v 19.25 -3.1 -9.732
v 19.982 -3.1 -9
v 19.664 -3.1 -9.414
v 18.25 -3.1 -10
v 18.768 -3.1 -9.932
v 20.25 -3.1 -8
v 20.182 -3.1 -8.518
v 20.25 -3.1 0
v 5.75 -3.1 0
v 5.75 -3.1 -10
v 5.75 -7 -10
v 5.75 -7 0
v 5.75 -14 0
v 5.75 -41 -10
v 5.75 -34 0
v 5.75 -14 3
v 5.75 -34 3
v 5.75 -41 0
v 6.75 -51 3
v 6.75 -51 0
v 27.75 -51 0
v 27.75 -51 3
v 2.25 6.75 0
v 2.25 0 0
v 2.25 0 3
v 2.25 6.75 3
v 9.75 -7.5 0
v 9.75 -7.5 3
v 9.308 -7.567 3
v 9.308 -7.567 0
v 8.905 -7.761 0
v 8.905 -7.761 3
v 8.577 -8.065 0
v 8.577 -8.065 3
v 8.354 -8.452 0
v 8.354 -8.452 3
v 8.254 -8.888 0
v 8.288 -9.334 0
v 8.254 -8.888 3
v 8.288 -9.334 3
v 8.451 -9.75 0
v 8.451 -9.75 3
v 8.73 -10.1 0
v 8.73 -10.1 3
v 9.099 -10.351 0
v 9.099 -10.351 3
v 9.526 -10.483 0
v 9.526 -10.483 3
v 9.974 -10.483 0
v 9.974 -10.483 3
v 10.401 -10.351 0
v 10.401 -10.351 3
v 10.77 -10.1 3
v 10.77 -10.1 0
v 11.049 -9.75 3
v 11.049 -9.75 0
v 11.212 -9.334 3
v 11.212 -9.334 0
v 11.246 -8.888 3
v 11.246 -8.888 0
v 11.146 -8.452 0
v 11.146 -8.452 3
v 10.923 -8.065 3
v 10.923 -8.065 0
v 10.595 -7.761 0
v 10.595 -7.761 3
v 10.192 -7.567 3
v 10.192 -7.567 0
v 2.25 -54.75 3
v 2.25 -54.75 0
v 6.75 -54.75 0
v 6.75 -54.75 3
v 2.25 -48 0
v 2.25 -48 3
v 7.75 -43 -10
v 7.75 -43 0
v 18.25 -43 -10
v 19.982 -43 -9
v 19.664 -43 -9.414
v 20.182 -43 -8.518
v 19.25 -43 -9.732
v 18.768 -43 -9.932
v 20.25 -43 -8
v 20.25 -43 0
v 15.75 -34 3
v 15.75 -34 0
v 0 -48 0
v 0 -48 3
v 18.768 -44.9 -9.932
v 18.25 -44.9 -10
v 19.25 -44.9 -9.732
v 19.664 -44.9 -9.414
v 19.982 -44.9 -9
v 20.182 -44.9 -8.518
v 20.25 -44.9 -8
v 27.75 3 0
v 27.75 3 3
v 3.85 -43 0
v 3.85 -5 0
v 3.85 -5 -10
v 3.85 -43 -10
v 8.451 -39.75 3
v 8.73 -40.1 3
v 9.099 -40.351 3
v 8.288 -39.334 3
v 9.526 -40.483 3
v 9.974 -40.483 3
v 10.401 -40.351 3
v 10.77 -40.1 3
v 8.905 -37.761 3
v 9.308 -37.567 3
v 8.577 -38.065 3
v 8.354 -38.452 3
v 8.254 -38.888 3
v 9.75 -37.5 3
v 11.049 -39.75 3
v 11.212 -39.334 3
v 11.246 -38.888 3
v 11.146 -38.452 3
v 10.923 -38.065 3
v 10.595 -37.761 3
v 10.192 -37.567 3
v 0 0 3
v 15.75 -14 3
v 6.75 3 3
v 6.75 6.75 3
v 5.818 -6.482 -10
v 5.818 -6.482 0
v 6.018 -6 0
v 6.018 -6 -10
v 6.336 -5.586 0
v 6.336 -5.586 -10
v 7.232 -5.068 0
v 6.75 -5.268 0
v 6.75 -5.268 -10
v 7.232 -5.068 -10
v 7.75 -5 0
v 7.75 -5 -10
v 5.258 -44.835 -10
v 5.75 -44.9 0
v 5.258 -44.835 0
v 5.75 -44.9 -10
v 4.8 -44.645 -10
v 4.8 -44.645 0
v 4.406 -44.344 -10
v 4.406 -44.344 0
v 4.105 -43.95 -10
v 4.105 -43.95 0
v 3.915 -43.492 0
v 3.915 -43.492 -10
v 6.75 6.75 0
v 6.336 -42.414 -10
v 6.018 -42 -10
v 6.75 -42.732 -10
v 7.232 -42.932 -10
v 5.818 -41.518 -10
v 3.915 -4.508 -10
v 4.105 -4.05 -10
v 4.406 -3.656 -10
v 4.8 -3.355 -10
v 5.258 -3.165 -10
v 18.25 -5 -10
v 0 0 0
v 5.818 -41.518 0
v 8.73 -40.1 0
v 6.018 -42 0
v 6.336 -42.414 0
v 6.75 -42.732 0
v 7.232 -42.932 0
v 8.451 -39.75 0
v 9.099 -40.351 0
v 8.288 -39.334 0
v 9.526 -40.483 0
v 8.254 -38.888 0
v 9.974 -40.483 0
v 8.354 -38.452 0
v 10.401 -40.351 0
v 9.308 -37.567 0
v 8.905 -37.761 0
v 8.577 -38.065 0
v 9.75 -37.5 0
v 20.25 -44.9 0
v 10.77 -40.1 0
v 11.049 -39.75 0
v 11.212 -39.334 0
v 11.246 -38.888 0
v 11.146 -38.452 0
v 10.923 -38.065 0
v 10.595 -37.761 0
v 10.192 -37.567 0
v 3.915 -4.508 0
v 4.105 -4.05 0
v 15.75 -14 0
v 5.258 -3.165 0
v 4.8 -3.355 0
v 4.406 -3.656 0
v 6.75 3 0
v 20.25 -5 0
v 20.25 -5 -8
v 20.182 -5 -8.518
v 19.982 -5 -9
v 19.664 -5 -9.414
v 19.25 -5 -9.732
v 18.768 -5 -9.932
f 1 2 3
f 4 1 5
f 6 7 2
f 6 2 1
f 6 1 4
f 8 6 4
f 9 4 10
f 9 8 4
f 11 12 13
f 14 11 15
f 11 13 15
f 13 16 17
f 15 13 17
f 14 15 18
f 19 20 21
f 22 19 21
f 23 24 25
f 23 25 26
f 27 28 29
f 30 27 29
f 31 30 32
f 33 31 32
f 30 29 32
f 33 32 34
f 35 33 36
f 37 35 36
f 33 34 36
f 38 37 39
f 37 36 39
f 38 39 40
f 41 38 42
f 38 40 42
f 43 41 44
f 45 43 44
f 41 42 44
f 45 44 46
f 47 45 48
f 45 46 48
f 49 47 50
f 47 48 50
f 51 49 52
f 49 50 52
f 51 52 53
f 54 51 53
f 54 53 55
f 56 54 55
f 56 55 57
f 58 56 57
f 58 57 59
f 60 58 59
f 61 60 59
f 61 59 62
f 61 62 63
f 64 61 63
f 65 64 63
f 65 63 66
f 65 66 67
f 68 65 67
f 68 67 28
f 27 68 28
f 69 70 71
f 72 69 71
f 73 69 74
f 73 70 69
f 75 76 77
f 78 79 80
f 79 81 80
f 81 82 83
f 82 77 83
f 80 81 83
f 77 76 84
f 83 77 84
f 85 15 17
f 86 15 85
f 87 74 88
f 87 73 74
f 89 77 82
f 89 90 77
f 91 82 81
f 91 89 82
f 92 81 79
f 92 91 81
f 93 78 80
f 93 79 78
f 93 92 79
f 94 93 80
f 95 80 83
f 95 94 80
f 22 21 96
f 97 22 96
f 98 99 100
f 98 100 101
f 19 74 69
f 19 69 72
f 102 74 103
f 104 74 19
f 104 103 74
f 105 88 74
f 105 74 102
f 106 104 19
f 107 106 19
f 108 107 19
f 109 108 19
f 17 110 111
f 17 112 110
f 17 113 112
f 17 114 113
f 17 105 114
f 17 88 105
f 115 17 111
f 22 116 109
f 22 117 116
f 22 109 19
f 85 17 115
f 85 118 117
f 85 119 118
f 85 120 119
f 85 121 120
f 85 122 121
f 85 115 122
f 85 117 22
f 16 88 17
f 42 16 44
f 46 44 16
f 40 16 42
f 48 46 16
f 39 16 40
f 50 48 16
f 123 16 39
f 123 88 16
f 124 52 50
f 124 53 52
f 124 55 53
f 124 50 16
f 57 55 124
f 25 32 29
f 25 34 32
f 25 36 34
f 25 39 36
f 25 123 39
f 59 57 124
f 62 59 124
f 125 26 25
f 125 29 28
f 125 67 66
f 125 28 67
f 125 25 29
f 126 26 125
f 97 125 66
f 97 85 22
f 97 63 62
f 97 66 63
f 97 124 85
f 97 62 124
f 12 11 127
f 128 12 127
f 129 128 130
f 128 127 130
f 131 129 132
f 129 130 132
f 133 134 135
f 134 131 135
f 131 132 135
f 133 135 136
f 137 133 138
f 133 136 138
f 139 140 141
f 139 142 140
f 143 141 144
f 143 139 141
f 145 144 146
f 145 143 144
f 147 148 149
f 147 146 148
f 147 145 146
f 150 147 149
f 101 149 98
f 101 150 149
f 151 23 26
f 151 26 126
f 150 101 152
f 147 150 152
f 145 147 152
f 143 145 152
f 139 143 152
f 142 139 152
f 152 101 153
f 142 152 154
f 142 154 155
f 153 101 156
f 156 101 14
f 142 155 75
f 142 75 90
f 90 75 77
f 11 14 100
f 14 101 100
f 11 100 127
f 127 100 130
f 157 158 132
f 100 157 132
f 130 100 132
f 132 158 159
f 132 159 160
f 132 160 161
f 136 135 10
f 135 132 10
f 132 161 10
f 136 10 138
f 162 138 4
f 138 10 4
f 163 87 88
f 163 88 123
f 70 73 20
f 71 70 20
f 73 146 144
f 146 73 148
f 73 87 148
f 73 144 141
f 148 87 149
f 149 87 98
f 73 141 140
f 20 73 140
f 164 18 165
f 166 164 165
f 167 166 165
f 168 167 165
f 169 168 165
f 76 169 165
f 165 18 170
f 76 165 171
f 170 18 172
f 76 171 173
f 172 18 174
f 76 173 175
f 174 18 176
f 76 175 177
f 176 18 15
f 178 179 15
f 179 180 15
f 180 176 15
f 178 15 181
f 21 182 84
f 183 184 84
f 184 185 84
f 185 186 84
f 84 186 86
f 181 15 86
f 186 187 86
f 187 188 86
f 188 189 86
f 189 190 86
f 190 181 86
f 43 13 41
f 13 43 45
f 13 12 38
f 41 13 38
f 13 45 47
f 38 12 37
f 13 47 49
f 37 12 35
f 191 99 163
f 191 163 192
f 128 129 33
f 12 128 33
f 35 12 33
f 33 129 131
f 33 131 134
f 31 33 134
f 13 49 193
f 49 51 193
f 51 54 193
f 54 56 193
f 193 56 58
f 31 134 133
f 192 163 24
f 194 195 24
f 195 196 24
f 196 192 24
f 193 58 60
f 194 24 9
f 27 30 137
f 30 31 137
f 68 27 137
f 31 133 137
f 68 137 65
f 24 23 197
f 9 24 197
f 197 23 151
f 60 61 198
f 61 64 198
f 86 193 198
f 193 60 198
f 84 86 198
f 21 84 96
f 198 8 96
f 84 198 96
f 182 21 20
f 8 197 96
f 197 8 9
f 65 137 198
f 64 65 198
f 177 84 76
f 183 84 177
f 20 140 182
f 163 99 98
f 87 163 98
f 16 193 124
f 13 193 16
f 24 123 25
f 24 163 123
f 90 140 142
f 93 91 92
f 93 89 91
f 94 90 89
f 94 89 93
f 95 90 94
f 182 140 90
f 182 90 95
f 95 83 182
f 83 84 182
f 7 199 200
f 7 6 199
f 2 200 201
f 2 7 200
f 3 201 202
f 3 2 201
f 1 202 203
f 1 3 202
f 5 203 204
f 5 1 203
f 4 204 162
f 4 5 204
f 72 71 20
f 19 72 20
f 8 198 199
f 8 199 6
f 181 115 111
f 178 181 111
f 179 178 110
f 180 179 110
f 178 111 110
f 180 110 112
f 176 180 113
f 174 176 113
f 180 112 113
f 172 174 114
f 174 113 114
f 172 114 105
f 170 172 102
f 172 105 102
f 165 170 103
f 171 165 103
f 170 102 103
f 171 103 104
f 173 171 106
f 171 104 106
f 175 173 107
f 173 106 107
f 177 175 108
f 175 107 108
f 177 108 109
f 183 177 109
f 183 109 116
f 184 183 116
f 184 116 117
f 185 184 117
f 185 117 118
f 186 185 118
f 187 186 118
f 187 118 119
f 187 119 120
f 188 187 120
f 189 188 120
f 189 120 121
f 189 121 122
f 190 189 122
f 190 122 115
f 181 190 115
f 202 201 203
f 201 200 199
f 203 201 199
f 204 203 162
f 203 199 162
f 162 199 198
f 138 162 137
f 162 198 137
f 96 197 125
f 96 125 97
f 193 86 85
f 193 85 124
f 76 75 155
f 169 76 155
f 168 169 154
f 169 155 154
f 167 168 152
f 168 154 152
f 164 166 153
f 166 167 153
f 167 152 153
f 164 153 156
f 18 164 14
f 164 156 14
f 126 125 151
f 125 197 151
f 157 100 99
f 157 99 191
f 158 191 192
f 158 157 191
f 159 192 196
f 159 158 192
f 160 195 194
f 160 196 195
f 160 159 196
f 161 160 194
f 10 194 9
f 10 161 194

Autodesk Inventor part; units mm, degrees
ref_plane "YZ Plane" through (0, 0, 0) normal (1, 0, 0) x (0, 1, 0)
ref_plane "XZ Plane" through (0, 0, 0) normal (0, 1, 0) x (-1, 0, 0)
ref_plane "XY Plane" through (0, 0, 0) normal (0, 0, 1) x (1, 0, 0)
ref_plane "Work Plane1" through (0, 0, 0) normal (0, 0, 1) x (1, 0, 0)
sketch "Sketch1" plane through (0, 0, 0) normal (0, 0, 1) x (1, 0, 0)
  line L0 (0, 0) -> (23.25, 0) projected
  line L1 (0, -48) -> (0, 0) projected
  line L2 (23.25, -48) -> (0, -48) projected
  line L3 (23.25, -48) -> (23.25, -31.5) projected
  line L4 (23.25, -31.5) -> (26.25, -31.5) projected
  line L5 (27.75, -30) -> (26.25, -31.5) projected
  line L6 (27.75, -30) -> (27.75, -18) projected
  line L7 (27.75, -18) -> (26.25, -16.5) projected
  line L8 (23.25, -16.5) -> (26.25, -16.5) projected
  line L9 (23.25, 0) -> (23.25, -16.5) projected
  line L10 (20.25, -16.5) -> (20.25, -3) projected
  line L11 (17.25, -16.5) -> (20.25, -16.5) projected
  line L12 (17.25, -16.5) -> (17.25, -19.5) projected
  line L13 (26.25, -19.5) -> (26.25, -28.5) projected
  line L14 (17.25, -28.5) -> (17.25, -31.5) projected
  line L15 (17.25, -31.5) -> (20.25, -31.5) projected
  line L16 (20.25, -31.5) -> (20.25, -45) projected
  line L17 (3.75, -45) -> (20.25, -45) projected
  line L18 (3.75, -3) -> (3.75, -45) projected
  line L19 (20.25, -3) -> (3.75, -3) projected
  line L20 (17.25, -19.5) -> (17.25, -28.5)
  line L21 (18.25, -33.5) -> (15.25, -33.5)
  line L22 (15.25, -33.5) -> (15.25, -28.5)
  line L23 (15.25, -28.5) -> (15.25, -19.5)
  line L24 (15.25, -19.5) -> (15.25, -14.5)
  line L25 (15.25, -14.5) -> (18.25, -14.5)
  line L26 (20.25, -5) -> (5.75, -5)
  line L27 (5.75, -5) -> (5.75, -43)
  line L28 (5.75, -43) -> (20.25, -43)
extrude "Extrusion1" add sketch "Sketch1" against normal blind 10 contours L26 L27 L28 L16 L17 L18 L19 L10
sketch "Sketch2" plane through (0, 0, 0) normal (0, 0, 1) x (1, 0, 0)
  line L0 (2.25, 0) -> (2.25, 6.75) projected
  line L1 (2.25, 0) -> (3.3, 0) projected
  line L2 (3.3, 0) -> (3.3, 5.7) projected
  line L3 (5.7, 5.7) -> (3.3, 5.7) projected
  line L4 (5.7, 1.95) -> (5.7, 5.7) projected
  line L5 (26.7, 1.95) -> (5.7, 1.95) projected
  line L6 (26.7, 1.95) -> (26.7, -16.95) projected
  line L7 (26.7, -16.95) -> (27.75, -18) projected
  line L8 (27.75, -18) -> (27.75, 3) projected
  line L9 (6.75, 3) -> (27.75, 3) projected
  line L10 (6.75, 3) -> (6.75, 6.75) projected
  line L11 (2.25, 6.75) -> (6.75, 6.75) projected
  line L12 (2.25, -54.75) -> (2.25, -48) projected
  line L13 (2.25, -54.75) -> (6.75, -54.75) projected
  line L14 (6.75, -54.75) -> (6.75, -51) projected
  line L15 (6.75, -51) -> (27.75, -51) projected
  line L16 (27.75, -51) -> (27.75, -30) projected
  line L17 (26.7, -31.05) -> (27.75, -30) projected
  line L18 (26.7, -31.05) -> (26.7, -49.95) projected
  line L19 (26.7, -49.95) -> (5.7, -49.95) projected
  line L20 (5.7, -49.95) -> (5.7, -53.7) projected
  line L21 (3.3, -53.7) -> (5.7, -53.7) projected
  line L22 (3.3, -53.7) -> (3.3, -48) projected
  line L23 (2.25, -48) -> (3.3, -48) projected
  line L24 (0, 0) -> (23.25, 0) projected
  line L25 (0, -48) -> (0, 0) projected
  line L26 (23.25, -48) -> (0, -48) projected
  line L27 (23.25, -48) -> (23.25, -31.5) projected
  line L28 (23.25, -31.5) -> (26.25, -31.5) projected
  line L29 (27.75, -30) -> (26.25, -31.5) projected
  line L30 (27.75, -30) -> (27.75, -18) projected
  line L31 (27.75, -18) -> (26.25, -16.5) projected
  line L32 (23.25, -16.5) -> (26.25, -16.5) projected
  line L33 (23.25, 0) -> (23.25, -16.5) projected
  line L34 (20.25, -16.5) -> (20.25, -3) projected
  line L35 (17.25, -16.5) -> (20.25, -16.5) projected
  line L36 (17.25, -16.5) -> (17.25, -19.5) projected
  line L37 (17.25, -19.5) -> (26.25, -19.5) projected
  line L38 (26.25, -19.5) -> (26.25, -28.5) projected
  line L39 (17.25, -28.5) -> (26.25, -28.5) projected
  line L40 (17.25, -28.5) -> (17.25, -31.5) projected
  line L41 (17.25, -31.5) -> (20.25, -31.5) projected
  line L42 (20.25, -31.5) -> (20.25, -45) projected
  line L43 (3.75, -45) -> (20.25, -45) projected
  line L44 (3.75, -3) -> (3.75, -45) projected
  line L45 (20.25, -3) -> (3.75, -3) projected
extrude "Extrusion2" add sketch "Sketch2" along normal blind 3 contours L0 L11 L10 L9 L8 L7 L6 L5 L4 L3 L2 L1 | L1 L24 L33 L32 L31 L7 L30 L17 L29 L28 L27 L26 L23 L25 | L2 L3 L4 L5 L6 L31 L32 L33 L24 | L23 L22 L21 L20 L19 L18 L17 L16 L15 L14 L13 L12 | L26 L27 L28 L29 L18 L19 L20 L21 L22 | L35 L36 L37 L38 L39 L40 L41 L42 L43 L44 L45 L34
sketch "Sketch3" plane through (0, 0, 0) normal (0, 0, -1) x (-1, 0, 0)
  line L0 (-5.75, -34) -> (-15.75, -34)
  line L1 (-15.75, -34) -> (-15.75, -14)
  line L2 (-15.75, -14) -> (-5.75, -14)
  line L3 (-5.75, -14) -> (-5.75, -34)
  line L4 (-3.75, -45) -> (-3.75, -3) construction
  line L5 (-3.75, -24) -> (-33.6662, -24) construction
  line L6 (-5.75, -5) -> (-5.75, -43) construction
  point P0 (0, 0)
  dimension "d5" = 10
  dimension "d6" = 20
extrude "Extrusion3" cut sketch "Sketch3" against normal through all
sketch "Sketch4" plane through (0, 0, 0) normal (0, 0, -1) x (-1, 0, 0)
  line L0 (-20.25, -5) -> (-5.75, -5) projected
  line L1 (-5.75, -43) -> (-20.25, -43) projected
  line L2 (-5.75, -5) -> (-5.75, -43) projected
  point P0 (0, 0)
  point P1 (-9.75, -9)
  point P2 (-9.75, -39)
  dimension "d9" = 4
  dimension "d10" = 4
  dimension "d11" = 4
  dimension "d12" = 4
hole "Hole1" at (9.75, -9, 0) at (9.75, -39, 0) direction (0, 0, 1) diameter 3 end through all
fillet "Fillet1" radius 2 6 edges at (20.25, -4, -10) (20.25, -44, -10) (3.75, -3, -5) (3.75, -45, -5) (5.75, -43, -5) (5.75, -5, -5)
thicken "Thicken1" operation add thickness 0.1 both sides no extend neighbours yes toward (0, 1, 0) faces at (14.75, -45, -3.3333) (4.75, -44.732, -3.3333) (3.75, -17.6667, -3.3333) (4.2839, -3.6397, -3.3333) (14.75, -3, -3.3333)
equation "\"d12\" = d11"
properties part number "camera_holder"
